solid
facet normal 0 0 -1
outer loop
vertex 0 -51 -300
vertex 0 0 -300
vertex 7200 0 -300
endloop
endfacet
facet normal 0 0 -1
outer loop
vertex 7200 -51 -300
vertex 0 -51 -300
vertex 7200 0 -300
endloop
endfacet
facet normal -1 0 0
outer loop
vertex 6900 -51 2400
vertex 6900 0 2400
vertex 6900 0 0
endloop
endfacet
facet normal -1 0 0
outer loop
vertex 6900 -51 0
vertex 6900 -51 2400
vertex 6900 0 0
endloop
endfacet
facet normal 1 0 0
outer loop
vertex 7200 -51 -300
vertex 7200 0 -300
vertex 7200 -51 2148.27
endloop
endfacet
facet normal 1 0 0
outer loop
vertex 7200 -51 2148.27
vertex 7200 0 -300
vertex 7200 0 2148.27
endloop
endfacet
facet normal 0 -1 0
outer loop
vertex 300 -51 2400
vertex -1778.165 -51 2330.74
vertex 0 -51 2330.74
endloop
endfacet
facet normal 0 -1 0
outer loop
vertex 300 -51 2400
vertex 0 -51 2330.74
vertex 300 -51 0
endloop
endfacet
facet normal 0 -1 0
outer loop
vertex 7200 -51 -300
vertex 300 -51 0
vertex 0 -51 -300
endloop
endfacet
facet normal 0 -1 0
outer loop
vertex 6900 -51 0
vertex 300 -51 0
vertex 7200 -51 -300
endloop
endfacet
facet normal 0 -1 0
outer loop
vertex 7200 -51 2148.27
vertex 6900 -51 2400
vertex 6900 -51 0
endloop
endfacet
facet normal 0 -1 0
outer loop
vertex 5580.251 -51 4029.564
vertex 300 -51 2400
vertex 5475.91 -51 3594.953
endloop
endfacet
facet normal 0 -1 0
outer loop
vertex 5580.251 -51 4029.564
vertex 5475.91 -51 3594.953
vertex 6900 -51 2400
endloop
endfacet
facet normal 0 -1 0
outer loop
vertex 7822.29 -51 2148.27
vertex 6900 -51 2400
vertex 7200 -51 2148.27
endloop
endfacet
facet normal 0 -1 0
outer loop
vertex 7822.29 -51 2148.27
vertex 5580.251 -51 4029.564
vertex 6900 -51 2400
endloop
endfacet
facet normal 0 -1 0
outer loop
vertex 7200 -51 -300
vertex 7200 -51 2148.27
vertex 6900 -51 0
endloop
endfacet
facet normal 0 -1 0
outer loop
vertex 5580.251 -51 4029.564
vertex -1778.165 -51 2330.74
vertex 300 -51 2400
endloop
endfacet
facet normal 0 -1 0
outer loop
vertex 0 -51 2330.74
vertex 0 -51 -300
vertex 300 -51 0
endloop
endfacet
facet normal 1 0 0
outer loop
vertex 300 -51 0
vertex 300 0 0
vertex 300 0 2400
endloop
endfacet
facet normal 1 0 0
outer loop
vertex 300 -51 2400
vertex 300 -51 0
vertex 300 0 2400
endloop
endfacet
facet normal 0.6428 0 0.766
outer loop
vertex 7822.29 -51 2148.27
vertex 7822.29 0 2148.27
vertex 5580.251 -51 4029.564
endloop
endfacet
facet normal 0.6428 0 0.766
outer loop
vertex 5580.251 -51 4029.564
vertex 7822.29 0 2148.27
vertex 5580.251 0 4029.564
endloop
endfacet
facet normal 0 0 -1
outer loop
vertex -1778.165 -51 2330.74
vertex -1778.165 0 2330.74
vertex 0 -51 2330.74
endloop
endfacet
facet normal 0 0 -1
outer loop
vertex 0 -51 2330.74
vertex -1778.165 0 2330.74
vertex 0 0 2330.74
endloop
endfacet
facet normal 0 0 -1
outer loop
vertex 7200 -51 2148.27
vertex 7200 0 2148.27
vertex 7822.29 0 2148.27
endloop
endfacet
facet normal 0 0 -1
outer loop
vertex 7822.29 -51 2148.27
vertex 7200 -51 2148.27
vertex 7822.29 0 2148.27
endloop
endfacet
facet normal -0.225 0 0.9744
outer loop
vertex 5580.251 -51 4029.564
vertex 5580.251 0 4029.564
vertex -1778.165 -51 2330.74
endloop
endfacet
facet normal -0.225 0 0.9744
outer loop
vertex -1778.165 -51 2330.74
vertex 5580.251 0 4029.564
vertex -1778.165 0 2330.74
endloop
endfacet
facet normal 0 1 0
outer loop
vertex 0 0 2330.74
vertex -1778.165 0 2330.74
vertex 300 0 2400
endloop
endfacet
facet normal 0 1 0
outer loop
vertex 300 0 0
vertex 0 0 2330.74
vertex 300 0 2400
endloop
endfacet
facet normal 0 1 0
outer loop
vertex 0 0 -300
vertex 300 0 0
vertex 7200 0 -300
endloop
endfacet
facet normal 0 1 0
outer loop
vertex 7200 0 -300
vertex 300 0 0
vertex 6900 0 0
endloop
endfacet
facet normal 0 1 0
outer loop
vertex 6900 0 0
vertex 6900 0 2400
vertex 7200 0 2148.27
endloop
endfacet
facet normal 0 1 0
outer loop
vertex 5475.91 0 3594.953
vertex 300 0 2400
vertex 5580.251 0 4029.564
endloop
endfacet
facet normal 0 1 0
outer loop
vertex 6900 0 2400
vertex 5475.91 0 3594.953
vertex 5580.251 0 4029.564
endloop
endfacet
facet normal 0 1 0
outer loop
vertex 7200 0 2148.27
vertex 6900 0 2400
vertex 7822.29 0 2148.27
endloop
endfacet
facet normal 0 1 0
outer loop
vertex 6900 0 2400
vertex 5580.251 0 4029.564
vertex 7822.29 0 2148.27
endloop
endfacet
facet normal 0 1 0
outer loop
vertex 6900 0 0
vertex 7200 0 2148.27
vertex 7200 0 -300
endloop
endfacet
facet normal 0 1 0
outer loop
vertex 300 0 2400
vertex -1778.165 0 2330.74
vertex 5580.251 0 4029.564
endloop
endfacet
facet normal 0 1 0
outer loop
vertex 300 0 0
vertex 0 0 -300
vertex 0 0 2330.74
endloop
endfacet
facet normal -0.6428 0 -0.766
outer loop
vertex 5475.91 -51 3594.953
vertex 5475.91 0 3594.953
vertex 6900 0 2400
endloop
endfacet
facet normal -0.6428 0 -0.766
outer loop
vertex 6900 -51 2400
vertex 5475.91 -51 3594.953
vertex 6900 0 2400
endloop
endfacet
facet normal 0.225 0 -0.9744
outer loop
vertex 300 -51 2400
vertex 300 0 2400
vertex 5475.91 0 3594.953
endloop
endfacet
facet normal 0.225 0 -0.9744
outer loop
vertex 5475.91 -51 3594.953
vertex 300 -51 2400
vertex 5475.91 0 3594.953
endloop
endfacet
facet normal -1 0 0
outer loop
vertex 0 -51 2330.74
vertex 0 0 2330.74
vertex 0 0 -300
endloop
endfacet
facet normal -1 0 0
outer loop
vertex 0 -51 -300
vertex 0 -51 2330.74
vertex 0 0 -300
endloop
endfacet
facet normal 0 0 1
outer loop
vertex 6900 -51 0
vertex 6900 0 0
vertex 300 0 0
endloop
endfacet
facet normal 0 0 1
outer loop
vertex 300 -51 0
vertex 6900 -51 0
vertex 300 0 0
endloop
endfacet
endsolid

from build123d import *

# Parameters (mm, degrees)
F1_DEPTH = 51


# Not quite as in the source:
# - a feature of the source that left no trace in its solid (it failed there, or was rolled back) is left out
# - a feature names something its author has since deleted; it is built from what else it names


with BuildPart() as f1:
    # F0 (on Front) → F1 (new body)
    with BuildSketch(Plane.XZ):
        Polygon((6900, 2400), (6900, 0), (7200, 0), (7200, 2148.2701106468), align=None)
        Polygon((-1778.1645930343, 2330.7395426623), (0, 2330.7395426623), (300, 2400), (5475.9103875206, 3594.9530685949), (6900, 2400), (7200, 2148.2701106468), (7822.2895307442, 2148.2701106468), (5580.2511632789, 4029.5636778722), align=None)
        Polygon((300, 0), (0, 0), (0, -300), (7200, -300), (7200, 0), (6900, 0), align=None)
        Polygon((0, 2330.7395426623), (0, 0), (300, 0), (300, 2400), align=None)
    extrude(amount=F1_DEPTH)


solid = f1.part
